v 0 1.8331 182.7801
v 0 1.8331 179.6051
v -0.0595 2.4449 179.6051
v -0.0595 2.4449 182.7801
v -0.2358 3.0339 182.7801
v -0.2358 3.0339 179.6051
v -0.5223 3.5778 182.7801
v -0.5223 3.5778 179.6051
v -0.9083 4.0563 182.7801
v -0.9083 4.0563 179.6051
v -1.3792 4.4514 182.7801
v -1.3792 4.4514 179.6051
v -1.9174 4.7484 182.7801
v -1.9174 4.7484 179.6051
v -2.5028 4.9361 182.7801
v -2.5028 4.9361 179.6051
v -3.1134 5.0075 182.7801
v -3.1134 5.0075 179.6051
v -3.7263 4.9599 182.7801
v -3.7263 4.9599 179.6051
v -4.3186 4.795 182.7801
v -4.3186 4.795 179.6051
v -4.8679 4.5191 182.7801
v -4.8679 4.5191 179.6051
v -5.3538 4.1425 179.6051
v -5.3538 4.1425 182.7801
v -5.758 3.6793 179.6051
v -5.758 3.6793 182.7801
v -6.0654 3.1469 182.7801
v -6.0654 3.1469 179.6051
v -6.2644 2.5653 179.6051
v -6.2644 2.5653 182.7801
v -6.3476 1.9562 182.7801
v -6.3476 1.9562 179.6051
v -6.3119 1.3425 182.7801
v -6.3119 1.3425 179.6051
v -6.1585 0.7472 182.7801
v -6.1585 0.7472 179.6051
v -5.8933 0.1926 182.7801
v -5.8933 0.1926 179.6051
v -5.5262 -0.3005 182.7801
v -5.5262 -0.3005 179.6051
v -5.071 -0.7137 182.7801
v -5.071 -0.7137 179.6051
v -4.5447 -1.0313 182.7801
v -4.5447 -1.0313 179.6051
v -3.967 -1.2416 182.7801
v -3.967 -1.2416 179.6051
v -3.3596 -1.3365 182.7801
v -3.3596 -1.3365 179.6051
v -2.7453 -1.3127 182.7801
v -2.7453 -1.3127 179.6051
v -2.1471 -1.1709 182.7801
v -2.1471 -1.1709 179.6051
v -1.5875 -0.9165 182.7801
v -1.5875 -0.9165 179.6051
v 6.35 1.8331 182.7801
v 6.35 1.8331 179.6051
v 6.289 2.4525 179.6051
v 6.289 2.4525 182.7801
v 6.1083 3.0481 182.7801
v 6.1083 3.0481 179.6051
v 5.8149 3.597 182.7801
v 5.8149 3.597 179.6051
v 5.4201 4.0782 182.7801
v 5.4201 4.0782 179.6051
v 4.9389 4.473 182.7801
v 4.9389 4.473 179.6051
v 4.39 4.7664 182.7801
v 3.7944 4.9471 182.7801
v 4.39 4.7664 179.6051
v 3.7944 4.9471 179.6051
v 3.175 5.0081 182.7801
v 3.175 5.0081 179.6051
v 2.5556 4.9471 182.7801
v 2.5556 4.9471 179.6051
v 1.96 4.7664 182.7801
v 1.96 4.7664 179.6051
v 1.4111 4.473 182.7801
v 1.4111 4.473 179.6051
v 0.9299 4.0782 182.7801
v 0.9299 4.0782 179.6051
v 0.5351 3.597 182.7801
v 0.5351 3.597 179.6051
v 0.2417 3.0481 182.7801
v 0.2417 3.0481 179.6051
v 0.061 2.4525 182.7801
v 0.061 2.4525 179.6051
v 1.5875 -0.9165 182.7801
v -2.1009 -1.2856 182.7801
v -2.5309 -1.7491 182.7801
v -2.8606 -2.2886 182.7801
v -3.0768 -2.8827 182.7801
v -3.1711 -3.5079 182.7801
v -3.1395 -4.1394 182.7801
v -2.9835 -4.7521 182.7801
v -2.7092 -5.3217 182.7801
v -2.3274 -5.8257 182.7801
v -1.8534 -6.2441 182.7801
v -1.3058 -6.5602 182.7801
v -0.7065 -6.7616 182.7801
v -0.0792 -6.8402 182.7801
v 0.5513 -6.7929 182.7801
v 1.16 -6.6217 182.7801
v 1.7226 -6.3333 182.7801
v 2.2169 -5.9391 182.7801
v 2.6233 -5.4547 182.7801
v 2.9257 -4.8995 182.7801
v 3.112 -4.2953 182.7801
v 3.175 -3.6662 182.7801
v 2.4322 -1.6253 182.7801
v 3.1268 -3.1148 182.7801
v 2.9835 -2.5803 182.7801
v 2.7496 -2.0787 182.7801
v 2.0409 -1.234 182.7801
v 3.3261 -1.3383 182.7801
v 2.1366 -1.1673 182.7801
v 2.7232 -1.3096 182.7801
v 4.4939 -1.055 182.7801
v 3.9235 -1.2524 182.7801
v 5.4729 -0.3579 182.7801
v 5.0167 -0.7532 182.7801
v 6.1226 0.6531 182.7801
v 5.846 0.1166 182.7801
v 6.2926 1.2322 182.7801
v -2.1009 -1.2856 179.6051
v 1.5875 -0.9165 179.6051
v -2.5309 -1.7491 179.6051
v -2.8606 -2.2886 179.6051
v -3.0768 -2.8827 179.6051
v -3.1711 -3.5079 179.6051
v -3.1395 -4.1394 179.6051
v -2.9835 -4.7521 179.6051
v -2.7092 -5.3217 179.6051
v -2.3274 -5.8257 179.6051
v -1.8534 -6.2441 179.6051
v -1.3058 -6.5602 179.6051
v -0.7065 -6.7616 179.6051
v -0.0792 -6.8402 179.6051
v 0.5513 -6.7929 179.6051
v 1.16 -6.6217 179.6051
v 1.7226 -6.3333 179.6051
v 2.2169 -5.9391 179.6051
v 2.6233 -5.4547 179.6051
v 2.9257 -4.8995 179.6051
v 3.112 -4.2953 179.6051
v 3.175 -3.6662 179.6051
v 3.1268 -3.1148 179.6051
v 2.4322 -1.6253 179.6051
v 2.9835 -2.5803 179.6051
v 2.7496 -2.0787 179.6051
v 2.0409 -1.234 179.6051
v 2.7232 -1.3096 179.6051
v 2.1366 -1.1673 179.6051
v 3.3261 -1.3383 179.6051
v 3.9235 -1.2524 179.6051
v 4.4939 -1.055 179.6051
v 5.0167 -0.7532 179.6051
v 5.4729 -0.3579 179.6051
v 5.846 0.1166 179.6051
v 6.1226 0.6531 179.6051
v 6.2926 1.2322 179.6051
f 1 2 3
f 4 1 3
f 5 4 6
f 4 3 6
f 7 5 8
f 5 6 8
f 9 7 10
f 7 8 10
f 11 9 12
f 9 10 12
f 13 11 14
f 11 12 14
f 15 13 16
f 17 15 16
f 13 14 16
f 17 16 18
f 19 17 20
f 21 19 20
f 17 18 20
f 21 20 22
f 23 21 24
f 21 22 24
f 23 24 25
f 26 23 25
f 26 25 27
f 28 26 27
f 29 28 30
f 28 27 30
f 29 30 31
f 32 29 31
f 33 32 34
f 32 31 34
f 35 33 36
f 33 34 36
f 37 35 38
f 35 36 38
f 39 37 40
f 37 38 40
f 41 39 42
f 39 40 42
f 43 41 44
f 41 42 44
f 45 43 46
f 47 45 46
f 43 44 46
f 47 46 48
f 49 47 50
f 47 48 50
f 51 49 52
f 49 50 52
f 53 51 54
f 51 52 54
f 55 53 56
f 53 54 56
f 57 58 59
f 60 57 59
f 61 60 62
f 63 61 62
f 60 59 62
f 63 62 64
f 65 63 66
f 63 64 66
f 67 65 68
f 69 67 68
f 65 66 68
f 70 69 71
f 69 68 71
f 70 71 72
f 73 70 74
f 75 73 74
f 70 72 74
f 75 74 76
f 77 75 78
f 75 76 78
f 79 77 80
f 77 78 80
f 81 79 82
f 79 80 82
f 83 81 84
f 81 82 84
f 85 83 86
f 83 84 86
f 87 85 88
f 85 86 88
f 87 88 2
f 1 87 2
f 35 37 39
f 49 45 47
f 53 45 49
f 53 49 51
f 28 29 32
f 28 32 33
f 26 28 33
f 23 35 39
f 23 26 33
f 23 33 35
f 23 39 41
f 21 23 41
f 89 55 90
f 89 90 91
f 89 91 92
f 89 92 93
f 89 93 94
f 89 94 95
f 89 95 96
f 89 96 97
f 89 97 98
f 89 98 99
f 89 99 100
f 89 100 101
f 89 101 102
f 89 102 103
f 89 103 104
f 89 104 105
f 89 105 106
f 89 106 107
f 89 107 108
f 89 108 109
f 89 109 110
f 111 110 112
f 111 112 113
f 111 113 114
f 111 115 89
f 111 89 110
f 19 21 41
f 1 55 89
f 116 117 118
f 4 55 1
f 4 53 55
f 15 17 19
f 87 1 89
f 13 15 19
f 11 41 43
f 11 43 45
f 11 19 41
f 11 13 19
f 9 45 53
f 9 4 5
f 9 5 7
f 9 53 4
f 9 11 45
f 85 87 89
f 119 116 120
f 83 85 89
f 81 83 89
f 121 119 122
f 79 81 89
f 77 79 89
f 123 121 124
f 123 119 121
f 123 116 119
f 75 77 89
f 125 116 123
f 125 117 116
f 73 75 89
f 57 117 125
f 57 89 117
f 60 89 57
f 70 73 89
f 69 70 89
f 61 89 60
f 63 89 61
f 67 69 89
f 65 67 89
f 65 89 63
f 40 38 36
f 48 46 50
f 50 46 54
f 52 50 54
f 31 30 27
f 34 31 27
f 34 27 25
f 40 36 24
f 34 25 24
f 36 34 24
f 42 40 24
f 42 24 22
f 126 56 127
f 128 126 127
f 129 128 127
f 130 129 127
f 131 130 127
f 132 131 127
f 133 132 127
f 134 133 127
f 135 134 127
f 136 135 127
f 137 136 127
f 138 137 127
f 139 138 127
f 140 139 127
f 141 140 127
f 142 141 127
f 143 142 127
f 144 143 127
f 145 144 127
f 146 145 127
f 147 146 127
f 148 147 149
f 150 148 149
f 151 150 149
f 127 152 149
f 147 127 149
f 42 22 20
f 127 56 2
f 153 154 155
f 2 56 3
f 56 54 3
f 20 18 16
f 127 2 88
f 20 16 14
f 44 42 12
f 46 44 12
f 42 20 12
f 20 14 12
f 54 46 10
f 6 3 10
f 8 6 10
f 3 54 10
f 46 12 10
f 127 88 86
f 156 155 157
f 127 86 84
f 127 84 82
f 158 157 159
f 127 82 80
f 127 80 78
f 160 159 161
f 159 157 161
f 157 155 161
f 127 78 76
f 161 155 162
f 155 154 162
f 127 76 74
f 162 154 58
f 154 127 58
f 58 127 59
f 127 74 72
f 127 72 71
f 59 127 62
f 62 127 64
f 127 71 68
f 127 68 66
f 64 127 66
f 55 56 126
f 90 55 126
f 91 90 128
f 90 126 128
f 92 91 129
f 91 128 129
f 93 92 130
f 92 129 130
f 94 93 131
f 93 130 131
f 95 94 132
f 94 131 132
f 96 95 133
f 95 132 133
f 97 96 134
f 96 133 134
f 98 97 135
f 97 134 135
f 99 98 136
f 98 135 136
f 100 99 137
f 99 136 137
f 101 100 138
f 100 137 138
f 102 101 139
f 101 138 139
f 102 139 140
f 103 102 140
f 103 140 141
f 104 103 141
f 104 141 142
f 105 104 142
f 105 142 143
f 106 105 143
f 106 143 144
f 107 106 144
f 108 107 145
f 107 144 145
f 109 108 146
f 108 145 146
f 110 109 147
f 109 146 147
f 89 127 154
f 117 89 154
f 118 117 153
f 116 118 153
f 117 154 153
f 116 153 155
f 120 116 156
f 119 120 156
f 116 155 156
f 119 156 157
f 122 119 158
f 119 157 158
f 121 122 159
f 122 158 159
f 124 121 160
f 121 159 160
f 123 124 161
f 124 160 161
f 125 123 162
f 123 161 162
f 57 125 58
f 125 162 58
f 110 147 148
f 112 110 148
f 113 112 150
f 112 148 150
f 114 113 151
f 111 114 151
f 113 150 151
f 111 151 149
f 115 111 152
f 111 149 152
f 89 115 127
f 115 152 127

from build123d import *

# Parameters (mm, degrees)
F12_DEPTH = 3.175


with BuildPart() as f12:
    # F10 (on plane+point) → F12 (new body)
    with BuildSketch(Plane.XY.offset(179.6051224214)):
        with BuildLine():
            ThreePointArc((-1.5874999976, -0.9165435509), (-1.5875000012, -6.4158048657), (3.175, -3.6661742094))
            ThreePointArc((3.175, -3.6661742094), (2.7496306536, -2.0786742034), (1.5874999882, -0.9165435455))
            ThreePointArc((1.5874999882, -0.9165435455), (-5.4e-09, -0.4911742094), (-1.5874999976, -0.9165435509))
        make_face()
        with BuildLine():
            ThreePointArc((-1.5874999976, -0.9165435509), (-5.4e-09, -0.4911742094), (1.5874999882, -0.9165435455))
            ThreePointArc((1.5874999882, -0.9165435455), (0.4253693396, 0.2455871106), (0, 1.8330871047))
            ThreePointArc((0, 1.8330871047), (-0.4253693423, 0.2455871059), (-1.5874999976, -0.9165435509))
        make_face()
        with BuildLine():
            ThreePointArc((0, 1.8330871047), (0.4253693396, 0.2455871106), (1.5874999882, -0.9165435455))
            ThreePointArc((1.5874999882, -0.9165435455), (4.7624999941, -0.9165435558), (6.35, 1.8330871047))
            ThreePointArc((6.35, 1.8330871047), (3.175, 5.0080871047), (0, 1.8330871047))
        make_face()
        with BuildLine():
            ThreePointArc((0, 1.8330871047), (-5.9246306577, 3.4205871035), (-1.5874999976, -0.9165435509))
            ThreePointArc((-1.5874999976, -0.9165435509), (-0.4253693423, 0.2455871059), (0, 1.8330871047))
        make_face()
    extrude(amount=F12_DEPTH)


solid = f12.part
